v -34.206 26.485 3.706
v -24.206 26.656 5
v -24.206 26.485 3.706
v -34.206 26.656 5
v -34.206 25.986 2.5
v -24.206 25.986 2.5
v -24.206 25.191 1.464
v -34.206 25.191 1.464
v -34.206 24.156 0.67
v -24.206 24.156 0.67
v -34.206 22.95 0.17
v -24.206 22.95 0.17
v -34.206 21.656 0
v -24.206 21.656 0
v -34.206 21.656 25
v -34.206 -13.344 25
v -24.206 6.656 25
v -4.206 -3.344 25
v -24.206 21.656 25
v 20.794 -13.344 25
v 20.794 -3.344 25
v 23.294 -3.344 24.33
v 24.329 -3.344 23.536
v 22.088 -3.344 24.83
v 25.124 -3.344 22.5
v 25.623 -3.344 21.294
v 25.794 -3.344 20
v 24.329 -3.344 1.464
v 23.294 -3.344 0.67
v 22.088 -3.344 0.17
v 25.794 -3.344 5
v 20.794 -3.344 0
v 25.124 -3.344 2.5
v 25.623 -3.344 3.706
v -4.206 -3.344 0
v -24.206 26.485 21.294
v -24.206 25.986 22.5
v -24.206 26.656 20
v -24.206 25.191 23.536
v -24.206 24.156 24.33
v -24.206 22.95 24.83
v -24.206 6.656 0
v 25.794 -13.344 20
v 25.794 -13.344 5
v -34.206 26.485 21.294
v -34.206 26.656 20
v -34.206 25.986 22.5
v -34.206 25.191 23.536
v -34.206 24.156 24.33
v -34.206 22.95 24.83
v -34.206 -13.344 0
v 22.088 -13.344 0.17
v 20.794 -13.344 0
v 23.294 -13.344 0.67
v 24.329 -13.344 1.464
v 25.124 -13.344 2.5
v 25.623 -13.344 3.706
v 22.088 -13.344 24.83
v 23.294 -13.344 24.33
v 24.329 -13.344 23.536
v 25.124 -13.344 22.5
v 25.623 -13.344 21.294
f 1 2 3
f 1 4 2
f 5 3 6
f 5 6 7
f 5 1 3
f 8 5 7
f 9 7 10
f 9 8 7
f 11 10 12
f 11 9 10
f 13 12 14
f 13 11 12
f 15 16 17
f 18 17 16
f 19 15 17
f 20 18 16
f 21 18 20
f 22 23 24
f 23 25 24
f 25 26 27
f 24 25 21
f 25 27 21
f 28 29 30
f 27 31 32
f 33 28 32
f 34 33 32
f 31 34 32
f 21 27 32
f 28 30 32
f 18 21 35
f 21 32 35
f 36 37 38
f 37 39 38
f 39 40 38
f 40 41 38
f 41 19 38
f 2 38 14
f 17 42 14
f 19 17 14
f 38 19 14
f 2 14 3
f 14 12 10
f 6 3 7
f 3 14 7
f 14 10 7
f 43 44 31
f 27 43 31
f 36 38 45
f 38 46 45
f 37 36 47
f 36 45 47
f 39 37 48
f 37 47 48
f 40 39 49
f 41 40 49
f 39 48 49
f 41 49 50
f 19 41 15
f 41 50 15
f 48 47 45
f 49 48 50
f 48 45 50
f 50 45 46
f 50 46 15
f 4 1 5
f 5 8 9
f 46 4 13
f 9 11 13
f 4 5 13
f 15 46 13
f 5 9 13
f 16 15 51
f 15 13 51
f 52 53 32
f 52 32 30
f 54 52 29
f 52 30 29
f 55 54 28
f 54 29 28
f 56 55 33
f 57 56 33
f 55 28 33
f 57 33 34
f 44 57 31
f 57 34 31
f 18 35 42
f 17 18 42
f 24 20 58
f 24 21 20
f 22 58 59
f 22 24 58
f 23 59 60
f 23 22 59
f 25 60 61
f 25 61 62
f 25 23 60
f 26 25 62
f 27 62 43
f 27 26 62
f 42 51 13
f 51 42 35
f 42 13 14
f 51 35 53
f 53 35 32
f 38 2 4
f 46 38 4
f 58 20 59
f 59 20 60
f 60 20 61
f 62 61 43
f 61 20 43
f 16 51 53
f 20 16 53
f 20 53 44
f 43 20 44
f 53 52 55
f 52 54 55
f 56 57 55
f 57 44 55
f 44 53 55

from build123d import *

# Parameters (mm, degrees)
F1_DEPTH = 25
F2_R     = 5
F3_R     = 5


with BuildPart() as f1:
    # F0 (on Top) → F1 (new body)
    with BuildSketch(Plane.XY):
        Polygon((-24.206446, 26.655727), (-34.206446, 26.655727), (-34.206446, -13.344273), (25.793554, -13.344273), (25.793554, -3.344273), (-4.206446, -3.344273), (-24.206446, 6.655727), align=None)
    extrude(amount=F1_DEPTH)

    # F2
    f2_edges = [f1.edges().sort_by_distance(p)[0] for p in [
        (-29.206446, 26.655727, 25),
        (-29.206446, 26.655727, 0),
    ]]
    fillet(f2_edges, radius=F2_R)

    # F3
    f3_edges = [f1.edges().sort_by_distance(p)[0] for p in [
        (25.793554, -8.344273, 25),
        (25.793554, -8.344273, 0),
    ]]
    fillet(f3_edges, radius=F3_R)


solid = f1.part
